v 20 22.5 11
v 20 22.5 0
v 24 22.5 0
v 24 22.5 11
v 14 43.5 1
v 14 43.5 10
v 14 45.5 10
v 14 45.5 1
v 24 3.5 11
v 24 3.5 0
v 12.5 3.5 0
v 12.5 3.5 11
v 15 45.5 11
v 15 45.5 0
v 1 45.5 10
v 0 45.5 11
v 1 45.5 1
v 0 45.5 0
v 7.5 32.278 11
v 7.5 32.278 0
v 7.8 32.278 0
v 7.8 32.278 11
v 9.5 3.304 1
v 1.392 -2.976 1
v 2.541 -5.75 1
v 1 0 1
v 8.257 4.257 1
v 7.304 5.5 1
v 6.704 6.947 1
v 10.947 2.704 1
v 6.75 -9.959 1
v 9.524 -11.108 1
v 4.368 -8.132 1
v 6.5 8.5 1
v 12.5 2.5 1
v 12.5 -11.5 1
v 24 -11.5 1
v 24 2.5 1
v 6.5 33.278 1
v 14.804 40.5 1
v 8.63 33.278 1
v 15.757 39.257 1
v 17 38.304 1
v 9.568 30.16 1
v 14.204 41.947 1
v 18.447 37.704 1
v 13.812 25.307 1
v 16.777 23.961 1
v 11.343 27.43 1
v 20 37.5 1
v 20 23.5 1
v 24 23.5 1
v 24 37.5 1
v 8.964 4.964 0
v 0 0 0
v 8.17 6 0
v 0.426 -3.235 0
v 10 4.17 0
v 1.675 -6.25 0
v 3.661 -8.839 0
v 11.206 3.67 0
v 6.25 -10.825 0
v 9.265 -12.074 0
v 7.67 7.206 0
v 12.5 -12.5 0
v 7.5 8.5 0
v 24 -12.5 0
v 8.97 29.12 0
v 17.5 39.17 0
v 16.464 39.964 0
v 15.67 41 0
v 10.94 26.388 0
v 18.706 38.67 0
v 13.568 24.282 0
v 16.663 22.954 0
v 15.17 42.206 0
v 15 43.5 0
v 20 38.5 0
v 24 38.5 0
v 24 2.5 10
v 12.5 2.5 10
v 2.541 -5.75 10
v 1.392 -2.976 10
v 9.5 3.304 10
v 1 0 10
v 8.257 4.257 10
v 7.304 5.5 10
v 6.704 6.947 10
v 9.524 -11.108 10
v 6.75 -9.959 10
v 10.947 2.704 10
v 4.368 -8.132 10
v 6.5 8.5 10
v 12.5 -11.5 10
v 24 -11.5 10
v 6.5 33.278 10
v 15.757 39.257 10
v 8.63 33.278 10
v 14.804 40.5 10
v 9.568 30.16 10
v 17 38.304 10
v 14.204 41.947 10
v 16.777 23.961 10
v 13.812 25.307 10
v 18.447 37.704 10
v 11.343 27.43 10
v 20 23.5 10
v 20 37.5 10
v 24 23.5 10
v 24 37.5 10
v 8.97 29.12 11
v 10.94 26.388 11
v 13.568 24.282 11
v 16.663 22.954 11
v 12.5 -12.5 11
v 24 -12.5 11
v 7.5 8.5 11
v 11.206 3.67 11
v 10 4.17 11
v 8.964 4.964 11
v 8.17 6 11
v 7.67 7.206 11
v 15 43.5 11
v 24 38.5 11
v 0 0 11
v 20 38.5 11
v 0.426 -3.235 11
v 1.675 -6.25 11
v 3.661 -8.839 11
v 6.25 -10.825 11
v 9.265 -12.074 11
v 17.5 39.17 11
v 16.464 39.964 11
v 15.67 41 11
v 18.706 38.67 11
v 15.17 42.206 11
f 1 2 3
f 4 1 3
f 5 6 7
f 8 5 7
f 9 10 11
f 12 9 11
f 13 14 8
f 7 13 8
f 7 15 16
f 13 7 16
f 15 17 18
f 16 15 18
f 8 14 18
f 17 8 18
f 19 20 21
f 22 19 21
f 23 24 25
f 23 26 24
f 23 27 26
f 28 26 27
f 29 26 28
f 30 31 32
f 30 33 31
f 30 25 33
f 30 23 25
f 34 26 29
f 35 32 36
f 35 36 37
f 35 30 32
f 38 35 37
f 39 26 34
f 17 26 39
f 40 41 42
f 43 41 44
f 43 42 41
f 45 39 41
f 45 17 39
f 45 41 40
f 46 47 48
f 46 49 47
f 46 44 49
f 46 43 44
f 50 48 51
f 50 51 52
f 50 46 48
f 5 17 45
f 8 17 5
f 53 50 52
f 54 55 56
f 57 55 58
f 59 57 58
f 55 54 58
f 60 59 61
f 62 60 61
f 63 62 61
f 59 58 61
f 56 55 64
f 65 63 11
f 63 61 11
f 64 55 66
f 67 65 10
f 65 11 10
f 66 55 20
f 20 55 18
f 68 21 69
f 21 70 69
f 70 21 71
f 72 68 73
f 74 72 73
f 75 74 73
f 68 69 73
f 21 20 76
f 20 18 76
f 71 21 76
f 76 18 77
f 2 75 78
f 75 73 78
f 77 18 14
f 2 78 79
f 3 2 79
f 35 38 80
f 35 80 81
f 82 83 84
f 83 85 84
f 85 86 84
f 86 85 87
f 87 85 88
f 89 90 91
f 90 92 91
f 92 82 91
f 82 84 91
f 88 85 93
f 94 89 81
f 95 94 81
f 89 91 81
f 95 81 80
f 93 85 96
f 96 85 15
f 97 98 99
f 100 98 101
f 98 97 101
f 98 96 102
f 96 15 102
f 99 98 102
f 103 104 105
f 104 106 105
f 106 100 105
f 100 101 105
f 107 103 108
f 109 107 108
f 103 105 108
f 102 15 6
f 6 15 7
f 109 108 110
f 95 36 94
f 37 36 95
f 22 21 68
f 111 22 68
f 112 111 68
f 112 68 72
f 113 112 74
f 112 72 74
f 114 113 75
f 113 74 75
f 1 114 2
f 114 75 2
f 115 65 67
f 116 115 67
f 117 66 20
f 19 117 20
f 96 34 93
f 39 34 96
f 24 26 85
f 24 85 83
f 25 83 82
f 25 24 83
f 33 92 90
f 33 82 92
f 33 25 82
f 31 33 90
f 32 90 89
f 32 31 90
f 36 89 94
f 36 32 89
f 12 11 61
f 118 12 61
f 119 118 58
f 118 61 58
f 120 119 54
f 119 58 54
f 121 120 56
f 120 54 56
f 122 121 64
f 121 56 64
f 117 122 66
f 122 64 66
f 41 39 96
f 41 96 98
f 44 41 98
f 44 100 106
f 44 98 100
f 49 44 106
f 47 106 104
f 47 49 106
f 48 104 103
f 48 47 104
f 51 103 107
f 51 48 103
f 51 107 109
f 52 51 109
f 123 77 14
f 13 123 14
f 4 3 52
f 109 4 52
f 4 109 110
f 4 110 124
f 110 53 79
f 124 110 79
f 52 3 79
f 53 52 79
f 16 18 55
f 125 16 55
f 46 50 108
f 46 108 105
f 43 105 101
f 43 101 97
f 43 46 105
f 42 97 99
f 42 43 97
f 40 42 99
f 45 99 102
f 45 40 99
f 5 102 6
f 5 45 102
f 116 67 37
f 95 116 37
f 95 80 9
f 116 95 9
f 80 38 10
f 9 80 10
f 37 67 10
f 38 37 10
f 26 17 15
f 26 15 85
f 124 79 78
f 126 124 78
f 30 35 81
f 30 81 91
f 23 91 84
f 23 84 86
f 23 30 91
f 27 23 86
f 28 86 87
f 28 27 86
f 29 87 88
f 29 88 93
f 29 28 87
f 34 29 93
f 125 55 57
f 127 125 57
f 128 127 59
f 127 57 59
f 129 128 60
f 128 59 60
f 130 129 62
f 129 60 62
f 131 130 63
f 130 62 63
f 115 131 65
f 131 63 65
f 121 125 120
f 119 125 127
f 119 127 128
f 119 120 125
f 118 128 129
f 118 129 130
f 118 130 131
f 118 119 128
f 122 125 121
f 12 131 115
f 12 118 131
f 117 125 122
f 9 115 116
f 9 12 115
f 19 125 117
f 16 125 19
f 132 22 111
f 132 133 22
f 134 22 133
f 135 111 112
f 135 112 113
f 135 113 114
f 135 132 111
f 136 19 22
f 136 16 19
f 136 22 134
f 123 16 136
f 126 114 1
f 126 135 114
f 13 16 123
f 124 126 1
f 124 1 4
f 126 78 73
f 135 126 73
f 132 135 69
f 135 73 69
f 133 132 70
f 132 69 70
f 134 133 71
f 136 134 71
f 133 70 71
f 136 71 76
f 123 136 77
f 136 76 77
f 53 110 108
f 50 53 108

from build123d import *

# Parameters (mm, degrees)
RESSALTO_EXTRUS_O1_DEPTH = 11
CASCA2_T                 = -1


with BuildPart() as part:
    # Esboço1 → Ressalto-extrusão1 (new body)
    with BuildSketch(Plane.XY):
        with BuildLine():
            Line((0, 45.5), (0, 0))
            ThreePointArc((0, 0), (3.661165235, -8.838834765), (12.5, -12.5))
            Line((12.5, -12.5), (24, -12.5))
            Line((24, -12.5), (24, 3.5))
            Line((24, 3.5), (12.5, 3.5))
            ThreePointArc((12.5, 3.5), (8.964466094, 4.964466094), (7.5, 8.5))
            Line((7.5, 8.5), (7.5, 32.277868482))
            Line((7.5, 32.277868482), (7.8, 32.277868482))
            ThreePointArc((7.8, 32.277868482), (12.182604141, 25.246112468), (20, 22.5))
            Line((20, 22.5), (24, 22.5))
            Line((24, 22.5), (24, 38.5))
            Line((24, 38.5), (20, 38.5))
            ThreePointArc((20, 38.5), (16.464466094, 39.964466094), (15, 43.5))
            Line((15, 43.5), (15, 45.5))
            Line((15, 45.5), (0, 45.5))
        make_face()
    extrude(amount=RESSALTO_EXTRUS_O1_DEPTH)

    # Casca2
    casca2_openings = [part.faces().sort_by_distance(p)[0] for p in [
        (24, 30.5, 5.5),
        (24, -4.5, 5.5),
        (7.5, 45.5, 5.5),
    ]]
    offset(amount=CASCA2_T, openings=casca2_openings, kind=Kind.INTERSECTION)


solid = part.part
